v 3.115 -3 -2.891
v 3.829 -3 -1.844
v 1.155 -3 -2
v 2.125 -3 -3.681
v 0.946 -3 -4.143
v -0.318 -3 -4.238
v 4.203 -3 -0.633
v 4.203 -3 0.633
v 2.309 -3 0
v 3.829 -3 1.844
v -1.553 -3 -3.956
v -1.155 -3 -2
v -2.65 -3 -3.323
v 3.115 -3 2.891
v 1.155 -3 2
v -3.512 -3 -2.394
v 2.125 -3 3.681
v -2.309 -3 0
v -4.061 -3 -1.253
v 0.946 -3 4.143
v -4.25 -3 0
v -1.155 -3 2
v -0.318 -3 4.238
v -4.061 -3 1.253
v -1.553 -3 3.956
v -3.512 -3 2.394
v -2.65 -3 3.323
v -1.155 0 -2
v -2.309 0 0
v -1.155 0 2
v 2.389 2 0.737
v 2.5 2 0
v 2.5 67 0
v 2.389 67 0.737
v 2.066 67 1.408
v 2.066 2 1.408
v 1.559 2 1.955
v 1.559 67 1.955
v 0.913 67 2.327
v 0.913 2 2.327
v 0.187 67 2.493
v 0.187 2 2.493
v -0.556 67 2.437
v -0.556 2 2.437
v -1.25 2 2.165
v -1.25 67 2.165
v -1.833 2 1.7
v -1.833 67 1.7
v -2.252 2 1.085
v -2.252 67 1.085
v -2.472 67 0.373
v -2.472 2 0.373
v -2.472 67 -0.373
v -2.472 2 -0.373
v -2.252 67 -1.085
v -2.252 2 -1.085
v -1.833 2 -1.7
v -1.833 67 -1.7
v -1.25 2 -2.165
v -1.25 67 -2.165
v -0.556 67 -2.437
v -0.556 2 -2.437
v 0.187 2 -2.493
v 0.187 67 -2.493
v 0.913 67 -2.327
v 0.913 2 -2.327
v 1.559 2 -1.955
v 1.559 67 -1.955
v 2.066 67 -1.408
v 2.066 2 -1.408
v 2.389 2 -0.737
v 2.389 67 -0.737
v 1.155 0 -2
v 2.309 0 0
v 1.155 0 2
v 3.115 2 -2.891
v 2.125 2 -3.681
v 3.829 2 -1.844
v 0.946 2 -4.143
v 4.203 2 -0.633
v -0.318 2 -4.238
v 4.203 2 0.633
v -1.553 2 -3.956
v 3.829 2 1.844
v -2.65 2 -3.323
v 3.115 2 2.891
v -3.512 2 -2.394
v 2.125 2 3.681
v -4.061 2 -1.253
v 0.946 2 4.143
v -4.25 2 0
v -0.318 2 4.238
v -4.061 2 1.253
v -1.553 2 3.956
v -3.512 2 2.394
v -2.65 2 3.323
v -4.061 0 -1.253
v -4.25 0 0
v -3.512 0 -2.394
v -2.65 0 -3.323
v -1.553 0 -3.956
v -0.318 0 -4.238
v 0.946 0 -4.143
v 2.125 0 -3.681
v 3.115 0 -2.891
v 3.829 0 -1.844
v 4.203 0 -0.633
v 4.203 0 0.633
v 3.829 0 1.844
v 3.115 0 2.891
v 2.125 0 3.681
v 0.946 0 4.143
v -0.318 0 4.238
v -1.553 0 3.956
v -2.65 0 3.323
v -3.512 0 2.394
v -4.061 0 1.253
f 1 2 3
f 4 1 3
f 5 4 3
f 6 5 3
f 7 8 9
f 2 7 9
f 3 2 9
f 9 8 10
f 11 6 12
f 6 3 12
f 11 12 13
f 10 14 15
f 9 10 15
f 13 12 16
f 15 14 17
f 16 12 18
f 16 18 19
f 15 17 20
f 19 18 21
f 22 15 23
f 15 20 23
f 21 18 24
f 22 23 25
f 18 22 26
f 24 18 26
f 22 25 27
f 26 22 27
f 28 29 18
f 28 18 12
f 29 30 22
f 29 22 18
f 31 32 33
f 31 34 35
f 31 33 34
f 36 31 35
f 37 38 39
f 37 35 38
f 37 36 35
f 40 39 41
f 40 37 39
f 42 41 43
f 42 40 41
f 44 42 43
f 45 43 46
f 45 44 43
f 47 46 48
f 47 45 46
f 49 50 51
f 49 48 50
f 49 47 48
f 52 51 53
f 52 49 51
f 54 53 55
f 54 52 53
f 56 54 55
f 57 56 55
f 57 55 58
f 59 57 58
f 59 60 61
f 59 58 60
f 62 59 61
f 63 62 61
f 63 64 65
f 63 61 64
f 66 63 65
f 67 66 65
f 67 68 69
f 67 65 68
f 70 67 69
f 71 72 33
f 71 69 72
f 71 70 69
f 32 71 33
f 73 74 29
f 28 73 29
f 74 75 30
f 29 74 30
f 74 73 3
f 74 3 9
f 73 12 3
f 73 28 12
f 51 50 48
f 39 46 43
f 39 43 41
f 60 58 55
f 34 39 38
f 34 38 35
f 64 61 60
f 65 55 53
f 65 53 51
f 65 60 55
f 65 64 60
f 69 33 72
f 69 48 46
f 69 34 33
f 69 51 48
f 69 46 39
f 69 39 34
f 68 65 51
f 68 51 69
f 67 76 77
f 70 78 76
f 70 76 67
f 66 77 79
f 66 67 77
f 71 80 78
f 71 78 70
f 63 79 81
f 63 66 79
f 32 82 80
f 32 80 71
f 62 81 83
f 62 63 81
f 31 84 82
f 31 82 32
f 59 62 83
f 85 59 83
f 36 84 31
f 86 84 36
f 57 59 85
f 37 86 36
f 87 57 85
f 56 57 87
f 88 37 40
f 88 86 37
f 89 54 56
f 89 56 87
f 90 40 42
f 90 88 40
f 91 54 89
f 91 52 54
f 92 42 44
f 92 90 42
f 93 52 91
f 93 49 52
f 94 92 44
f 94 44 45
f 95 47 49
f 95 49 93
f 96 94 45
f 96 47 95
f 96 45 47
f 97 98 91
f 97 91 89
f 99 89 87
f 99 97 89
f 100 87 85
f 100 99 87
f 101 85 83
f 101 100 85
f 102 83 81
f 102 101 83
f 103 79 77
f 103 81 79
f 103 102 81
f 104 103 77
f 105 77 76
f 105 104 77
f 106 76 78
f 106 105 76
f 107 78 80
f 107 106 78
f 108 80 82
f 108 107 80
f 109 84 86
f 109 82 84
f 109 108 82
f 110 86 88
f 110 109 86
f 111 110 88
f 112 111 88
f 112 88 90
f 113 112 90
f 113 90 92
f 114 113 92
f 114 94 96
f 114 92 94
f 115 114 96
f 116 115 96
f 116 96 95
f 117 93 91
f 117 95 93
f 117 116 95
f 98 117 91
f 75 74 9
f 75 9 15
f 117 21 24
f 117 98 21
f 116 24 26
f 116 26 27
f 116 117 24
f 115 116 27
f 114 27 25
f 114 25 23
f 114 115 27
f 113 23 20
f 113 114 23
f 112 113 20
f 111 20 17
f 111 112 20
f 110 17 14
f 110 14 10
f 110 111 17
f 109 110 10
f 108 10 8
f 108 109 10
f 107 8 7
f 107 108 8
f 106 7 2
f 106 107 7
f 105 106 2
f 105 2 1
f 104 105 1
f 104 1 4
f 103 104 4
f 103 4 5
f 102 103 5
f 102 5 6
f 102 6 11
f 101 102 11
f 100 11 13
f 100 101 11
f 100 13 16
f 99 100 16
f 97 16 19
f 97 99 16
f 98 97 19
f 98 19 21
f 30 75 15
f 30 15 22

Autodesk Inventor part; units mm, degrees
ref_plane "YZ Plane" through (0, 0, 0) normal (1, 0, 0) x (0, 1, 0)
ref_plane "XZ Plane" through (0, 0, 0) normal (0, 1, 0) x (-1, 0, 0)
ref_plane "XY Plane" through (0, 0, 0) normal (0, 0, 1) x (1, 0, 0)
sketch "Szkic1" plane through (0, 0, 0) normal (0, 1, 0) x (-1, 0, 0)
  circle A0 centre (0, 0) radius 4.25
  line L0 (1.1547, 2) -> (2.3094, 0)
  line L1 (2.3094, 0) -> (1.1547, -2)
  line L2 (1.1547, -2) -> (-1.1547, -2)
  line L3 (-1.1547, -2) -> (-2.3094, 0)
  line L4 (-2.3094, 0) -> (-1.1547, 2)
  line L5 (-1.1547, 2) -> (1.1547, 2)
  circle A1 centre (0, 0) radius 2.5
  dimension "d0" = 8.5
  dimension "d1" = 4
  dimension "d2" = 5
extrude "Wyciągnięcie proste1" add sketch "Szkic1" along normal blind 2 contours A0 | L0 L1 L2 L3 L4 L5 | A1
extrude "Wyciągnięcie proste2" add sketch "Szkic1" against normal blind 3 contours A0 | A1
sketch "Szkic2" plane through (0, 2, 0) normal (0, 1, 0) x (1, 0, 0)
  circle A0 centre (0, 0) radius 2.5
  dimension "d7" = 5
extrude "Wyciągnięcie proste3" add sketch "Szkic2" along normal blind 65
thread "Gwint1" size "M6x1" class "6g" standard "ANSI Metric M Profile" length 65
properties part number "M5x65" material "Aluminum 6061"
